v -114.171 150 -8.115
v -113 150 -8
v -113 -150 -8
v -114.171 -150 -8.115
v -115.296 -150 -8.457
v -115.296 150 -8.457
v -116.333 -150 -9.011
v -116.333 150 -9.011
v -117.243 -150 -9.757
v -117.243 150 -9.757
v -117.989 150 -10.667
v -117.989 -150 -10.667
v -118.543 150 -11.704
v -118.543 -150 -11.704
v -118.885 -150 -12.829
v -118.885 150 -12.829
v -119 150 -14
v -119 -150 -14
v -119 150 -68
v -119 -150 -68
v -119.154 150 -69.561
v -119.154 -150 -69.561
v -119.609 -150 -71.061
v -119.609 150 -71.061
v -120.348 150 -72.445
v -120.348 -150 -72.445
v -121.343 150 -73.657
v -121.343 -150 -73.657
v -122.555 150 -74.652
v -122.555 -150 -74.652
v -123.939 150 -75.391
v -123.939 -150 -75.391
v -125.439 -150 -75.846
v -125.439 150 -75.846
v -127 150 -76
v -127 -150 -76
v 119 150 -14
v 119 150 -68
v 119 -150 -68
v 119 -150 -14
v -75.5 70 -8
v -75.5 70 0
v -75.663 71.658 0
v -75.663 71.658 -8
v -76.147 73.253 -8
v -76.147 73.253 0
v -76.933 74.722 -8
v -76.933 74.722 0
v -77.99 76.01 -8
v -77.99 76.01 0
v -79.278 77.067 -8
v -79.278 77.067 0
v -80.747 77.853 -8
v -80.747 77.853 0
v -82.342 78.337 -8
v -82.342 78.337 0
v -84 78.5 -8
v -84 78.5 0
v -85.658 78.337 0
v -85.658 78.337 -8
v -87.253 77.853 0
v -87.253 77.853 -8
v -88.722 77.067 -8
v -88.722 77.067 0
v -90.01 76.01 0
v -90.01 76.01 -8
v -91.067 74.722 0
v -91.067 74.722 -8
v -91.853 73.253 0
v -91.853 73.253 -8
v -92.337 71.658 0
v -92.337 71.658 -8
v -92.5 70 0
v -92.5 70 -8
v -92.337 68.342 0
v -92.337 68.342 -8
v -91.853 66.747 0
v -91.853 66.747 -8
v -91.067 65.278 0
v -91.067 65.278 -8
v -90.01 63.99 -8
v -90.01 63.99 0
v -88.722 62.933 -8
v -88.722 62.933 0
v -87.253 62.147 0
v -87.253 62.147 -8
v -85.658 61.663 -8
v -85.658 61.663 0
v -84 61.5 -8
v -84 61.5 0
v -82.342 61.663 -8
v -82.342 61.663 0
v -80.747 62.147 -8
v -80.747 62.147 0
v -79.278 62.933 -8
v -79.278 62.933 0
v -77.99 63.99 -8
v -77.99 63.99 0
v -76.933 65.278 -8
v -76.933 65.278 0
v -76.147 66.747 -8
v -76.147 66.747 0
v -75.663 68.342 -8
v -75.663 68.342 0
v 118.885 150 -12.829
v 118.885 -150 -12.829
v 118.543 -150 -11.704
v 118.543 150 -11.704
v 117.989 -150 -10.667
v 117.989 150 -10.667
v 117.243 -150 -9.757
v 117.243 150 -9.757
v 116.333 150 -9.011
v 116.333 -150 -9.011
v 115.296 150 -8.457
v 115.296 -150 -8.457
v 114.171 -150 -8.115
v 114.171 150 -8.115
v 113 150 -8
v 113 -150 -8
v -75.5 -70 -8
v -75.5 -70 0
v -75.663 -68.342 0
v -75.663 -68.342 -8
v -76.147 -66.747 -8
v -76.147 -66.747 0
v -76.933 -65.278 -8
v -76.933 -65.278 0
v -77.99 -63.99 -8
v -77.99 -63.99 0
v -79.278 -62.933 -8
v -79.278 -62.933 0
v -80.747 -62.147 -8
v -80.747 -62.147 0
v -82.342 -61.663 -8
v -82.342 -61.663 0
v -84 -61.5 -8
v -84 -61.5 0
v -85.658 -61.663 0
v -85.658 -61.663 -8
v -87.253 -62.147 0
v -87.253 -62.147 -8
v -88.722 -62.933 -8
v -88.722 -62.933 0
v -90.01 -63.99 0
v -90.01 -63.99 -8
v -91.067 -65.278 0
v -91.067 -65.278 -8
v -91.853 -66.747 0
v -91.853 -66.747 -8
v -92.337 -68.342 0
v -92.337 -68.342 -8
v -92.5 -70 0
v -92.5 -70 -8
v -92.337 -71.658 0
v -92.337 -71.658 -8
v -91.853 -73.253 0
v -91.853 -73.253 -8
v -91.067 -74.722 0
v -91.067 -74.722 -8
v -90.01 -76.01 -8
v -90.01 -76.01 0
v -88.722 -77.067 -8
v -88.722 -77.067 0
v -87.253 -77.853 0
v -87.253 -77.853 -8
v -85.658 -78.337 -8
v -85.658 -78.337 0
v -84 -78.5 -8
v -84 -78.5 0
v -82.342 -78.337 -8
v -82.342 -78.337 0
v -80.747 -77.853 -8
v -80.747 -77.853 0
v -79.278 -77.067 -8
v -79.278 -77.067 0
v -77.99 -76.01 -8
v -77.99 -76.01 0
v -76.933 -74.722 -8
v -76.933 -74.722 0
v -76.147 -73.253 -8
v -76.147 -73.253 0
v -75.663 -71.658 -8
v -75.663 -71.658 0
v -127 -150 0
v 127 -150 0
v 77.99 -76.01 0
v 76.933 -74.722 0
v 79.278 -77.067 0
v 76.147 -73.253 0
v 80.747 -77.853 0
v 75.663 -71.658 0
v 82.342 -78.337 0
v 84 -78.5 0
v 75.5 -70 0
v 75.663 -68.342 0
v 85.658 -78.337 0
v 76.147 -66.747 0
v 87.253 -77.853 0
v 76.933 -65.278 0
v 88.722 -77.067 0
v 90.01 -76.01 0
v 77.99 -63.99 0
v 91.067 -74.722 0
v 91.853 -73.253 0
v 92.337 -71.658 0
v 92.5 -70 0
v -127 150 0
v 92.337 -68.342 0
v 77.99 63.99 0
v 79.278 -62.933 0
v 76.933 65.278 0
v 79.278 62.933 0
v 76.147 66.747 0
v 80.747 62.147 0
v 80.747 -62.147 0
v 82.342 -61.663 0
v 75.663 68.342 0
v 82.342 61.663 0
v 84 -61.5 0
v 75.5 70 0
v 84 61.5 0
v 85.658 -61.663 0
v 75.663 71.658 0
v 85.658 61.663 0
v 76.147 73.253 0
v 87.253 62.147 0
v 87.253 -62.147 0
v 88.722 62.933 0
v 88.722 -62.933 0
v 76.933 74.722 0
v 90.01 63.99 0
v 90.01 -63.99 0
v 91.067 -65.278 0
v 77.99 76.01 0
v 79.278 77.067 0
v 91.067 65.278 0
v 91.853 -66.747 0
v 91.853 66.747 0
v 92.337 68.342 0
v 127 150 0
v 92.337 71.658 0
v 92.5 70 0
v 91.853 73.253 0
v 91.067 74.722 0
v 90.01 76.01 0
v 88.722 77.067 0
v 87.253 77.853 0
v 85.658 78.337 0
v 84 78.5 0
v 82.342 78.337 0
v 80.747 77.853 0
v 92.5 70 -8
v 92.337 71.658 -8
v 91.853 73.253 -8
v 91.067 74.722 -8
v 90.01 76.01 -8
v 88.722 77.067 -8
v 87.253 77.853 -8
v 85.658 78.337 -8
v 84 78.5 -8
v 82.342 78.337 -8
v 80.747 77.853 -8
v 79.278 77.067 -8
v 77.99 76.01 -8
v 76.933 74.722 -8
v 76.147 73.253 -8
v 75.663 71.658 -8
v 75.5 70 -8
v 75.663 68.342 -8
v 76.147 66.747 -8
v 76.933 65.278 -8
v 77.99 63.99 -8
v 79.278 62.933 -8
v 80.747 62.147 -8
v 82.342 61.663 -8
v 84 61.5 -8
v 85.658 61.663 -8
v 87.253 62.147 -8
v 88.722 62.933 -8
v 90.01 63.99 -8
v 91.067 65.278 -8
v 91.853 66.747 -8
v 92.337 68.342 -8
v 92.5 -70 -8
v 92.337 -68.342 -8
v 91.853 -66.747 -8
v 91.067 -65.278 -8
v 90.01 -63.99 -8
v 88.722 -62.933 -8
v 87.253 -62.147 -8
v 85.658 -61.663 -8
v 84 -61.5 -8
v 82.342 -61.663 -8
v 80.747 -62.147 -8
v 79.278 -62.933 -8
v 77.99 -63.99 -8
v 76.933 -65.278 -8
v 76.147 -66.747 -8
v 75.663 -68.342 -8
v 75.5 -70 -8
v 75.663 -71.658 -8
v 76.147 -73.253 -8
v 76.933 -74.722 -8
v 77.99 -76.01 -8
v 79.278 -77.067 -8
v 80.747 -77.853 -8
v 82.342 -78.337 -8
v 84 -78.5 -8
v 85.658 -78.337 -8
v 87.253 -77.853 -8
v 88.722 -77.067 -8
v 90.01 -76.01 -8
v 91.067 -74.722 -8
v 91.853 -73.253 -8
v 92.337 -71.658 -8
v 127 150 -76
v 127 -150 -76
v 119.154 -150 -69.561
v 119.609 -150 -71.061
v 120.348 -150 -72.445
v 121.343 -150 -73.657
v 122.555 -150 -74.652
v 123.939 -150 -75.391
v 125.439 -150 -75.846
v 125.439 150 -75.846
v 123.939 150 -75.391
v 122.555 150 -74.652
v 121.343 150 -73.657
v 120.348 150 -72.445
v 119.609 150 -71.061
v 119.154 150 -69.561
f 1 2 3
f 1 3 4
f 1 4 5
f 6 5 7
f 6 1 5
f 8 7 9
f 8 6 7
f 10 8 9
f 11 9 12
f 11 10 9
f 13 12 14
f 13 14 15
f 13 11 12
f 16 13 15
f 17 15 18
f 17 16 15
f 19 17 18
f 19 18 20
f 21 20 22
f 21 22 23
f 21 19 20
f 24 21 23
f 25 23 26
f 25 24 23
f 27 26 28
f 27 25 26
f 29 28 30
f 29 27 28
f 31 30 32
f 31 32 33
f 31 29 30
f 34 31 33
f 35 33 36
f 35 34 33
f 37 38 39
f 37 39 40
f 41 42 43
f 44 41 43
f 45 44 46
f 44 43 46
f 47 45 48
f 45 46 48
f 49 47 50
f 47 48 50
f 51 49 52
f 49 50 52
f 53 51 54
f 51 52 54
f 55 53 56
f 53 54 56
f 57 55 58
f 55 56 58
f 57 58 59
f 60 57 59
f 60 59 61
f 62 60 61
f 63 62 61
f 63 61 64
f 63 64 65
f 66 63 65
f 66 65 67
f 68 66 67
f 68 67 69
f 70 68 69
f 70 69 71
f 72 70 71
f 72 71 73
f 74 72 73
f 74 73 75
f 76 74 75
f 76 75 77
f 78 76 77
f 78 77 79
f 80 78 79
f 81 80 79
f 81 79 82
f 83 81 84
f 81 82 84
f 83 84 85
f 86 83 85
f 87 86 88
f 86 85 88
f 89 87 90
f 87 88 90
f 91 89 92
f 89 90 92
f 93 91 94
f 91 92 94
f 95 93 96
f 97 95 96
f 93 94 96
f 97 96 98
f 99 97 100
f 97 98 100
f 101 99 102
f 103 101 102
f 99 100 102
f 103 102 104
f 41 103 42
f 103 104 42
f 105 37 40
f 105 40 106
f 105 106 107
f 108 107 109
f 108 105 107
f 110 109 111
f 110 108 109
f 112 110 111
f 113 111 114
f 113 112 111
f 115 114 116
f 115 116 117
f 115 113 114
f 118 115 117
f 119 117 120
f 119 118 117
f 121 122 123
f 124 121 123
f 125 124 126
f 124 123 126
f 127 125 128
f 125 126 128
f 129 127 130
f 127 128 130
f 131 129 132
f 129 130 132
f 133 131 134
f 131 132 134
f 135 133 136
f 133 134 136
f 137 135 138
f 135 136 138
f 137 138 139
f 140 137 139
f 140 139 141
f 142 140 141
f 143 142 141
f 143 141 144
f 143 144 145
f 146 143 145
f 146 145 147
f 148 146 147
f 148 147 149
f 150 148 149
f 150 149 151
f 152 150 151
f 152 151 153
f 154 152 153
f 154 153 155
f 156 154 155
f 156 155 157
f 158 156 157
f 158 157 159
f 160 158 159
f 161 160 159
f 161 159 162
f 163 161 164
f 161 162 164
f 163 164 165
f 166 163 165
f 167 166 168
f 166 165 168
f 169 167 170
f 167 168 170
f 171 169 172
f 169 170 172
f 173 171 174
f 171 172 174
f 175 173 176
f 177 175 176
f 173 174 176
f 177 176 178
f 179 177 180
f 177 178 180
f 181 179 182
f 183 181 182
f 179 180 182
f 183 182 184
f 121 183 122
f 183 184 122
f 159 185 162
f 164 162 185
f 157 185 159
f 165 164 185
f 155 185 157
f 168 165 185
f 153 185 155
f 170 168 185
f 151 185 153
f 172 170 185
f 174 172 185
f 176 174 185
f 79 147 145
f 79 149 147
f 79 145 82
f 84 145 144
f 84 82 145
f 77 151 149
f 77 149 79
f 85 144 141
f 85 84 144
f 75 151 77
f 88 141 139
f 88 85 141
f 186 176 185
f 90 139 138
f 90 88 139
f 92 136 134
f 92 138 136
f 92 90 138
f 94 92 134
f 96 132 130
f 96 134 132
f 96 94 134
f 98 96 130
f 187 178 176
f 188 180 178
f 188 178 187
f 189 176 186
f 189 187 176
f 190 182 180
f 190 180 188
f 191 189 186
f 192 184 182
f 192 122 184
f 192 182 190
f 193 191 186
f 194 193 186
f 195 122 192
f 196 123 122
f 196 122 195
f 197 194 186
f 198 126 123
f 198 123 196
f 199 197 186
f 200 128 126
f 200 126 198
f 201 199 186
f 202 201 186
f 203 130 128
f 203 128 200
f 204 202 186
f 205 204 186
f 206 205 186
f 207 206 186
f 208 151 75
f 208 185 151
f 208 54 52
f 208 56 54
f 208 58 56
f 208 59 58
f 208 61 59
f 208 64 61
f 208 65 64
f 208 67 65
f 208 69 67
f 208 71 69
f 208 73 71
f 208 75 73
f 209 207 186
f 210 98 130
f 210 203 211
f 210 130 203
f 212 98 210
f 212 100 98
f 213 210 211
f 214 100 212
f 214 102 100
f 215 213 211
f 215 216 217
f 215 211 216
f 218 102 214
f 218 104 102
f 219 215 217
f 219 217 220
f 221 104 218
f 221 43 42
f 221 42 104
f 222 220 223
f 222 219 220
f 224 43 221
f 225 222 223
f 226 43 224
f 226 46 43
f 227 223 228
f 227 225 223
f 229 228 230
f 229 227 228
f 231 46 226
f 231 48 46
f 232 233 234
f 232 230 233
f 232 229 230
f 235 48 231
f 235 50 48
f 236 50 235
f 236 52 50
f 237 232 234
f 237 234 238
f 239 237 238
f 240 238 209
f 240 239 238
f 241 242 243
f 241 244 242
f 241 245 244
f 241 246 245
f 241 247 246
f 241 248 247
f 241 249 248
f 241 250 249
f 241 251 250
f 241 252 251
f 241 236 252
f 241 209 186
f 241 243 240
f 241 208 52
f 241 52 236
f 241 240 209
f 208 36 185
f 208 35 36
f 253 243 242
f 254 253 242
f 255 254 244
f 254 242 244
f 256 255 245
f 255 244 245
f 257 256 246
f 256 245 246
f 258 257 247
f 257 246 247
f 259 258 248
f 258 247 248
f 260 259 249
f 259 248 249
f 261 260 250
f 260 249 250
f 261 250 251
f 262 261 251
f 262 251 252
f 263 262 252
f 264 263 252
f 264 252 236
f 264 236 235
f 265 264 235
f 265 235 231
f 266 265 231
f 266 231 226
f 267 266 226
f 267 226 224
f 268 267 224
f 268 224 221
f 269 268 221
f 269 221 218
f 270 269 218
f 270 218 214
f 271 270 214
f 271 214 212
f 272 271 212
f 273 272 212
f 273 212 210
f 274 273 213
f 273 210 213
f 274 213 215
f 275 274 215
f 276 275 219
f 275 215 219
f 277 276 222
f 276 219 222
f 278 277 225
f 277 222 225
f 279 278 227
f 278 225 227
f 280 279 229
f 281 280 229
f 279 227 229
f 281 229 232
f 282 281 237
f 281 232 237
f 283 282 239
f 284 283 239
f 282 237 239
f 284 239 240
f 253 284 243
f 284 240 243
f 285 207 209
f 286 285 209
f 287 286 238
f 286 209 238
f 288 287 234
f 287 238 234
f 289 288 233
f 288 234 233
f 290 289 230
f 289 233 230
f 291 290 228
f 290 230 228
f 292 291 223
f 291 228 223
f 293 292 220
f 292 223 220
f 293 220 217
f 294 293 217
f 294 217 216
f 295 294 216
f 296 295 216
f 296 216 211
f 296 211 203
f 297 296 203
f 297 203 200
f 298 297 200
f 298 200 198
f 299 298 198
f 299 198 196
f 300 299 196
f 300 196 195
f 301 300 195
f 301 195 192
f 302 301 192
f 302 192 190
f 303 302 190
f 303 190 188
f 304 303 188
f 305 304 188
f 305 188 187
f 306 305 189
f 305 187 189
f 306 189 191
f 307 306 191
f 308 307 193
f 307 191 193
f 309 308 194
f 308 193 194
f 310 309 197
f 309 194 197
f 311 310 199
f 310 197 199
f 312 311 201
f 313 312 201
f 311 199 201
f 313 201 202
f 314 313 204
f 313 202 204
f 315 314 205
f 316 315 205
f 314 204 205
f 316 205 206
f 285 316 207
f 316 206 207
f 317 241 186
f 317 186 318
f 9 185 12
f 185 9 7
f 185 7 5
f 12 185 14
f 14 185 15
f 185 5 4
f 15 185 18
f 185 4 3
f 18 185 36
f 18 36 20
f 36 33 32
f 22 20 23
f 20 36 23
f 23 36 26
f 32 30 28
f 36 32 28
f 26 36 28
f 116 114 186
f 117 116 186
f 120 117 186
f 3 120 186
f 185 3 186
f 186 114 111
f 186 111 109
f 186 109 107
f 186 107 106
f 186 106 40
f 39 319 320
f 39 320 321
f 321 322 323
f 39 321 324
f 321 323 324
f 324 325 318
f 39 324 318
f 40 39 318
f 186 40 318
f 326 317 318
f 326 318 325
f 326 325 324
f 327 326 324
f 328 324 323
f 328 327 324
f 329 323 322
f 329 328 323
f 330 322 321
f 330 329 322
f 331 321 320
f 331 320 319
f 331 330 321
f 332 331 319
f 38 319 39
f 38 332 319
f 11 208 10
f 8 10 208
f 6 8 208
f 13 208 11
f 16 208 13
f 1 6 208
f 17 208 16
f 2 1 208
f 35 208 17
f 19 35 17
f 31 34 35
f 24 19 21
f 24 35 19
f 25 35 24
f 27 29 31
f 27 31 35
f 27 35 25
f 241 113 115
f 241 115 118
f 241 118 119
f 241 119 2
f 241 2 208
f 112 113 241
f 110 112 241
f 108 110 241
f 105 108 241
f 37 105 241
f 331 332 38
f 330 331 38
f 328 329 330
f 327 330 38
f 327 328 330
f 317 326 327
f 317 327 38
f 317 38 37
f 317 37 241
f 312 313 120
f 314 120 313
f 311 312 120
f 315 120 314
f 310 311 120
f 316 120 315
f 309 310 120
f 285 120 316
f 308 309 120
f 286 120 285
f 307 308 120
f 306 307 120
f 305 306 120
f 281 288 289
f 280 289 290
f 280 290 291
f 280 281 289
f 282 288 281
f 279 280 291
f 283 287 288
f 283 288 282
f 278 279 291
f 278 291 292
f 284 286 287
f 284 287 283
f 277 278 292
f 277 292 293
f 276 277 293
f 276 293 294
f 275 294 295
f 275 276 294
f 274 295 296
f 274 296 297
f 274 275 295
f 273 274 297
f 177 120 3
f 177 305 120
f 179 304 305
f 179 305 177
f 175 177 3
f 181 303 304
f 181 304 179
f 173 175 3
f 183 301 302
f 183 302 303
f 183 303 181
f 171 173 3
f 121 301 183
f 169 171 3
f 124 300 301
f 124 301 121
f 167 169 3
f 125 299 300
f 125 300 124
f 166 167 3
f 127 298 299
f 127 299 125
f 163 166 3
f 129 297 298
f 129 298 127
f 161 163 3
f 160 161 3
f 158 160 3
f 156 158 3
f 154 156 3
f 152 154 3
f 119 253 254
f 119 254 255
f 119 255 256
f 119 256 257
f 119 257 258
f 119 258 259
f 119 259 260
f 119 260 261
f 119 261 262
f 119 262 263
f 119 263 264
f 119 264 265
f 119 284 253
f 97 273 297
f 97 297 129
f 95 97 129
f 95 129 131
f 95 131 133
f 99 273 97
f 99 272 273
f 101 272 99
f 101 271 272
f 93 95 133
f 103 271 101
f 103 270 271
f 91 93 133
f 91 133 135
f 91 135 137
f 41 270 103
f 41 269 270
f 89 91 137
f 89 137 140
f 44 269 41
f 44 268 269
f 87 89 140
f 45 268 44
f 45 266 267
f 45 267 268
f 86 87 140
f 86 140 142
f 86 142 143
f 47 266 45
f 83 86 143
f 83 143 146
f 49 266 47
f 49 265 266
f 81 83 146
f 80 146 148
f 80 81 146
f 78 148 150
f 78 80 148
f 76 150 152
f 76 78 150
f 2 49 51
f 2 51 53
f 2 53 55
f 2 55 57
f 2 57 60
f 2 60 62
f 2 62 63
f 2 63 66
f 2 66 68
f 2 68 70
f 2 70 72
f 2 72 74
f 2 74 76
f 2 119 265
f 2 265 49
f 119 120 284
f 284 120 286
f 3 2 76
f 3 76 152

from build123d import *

# Parameters (mm, degrees)
EXTRUDE1_DEPTH     = 150
CUT_EXTRUDE1_REACH = 78
SKETCH2_R          = 8.5


with BuildPart() as part:
    # Sketch1 → Extrude1 (new body, symmetric)
    with BuildSketch(Plane(origin=(0, 0, 0), x_dir=(1, 0, 0), z_dir=(0, 1, 0))):
        with BuildLine():
            Line((-127, 0), (127, 0))
            Line((127, 0), (127, 76))
            ThreePointArc((127, 76), (121.343145751, 73.656854249), (119, 68))
            Line((119, 68), (119, 14))
            ThreePointArc((119, 14), (117.242640687, 9.757359313), (113, 8))
            Line((113, 8), (-113, 8))
            ThreePointArc((-113, 8), (-117.242640687, 9.757359313), (-119, 14))
            Line((-119, 14), (-119, 68))
            ThreePointArc((-119, 68), (-121.343145751, 73.656854249), (-127, 76))
            Line((-127, 76), (-127, 0))
        make_face()
    extrude(amount=EXTRUDE1_DEPTH, both=True)

    # Sketch2 → Cut-Extrude1 (cut, up to next)
    with BuildSketch(Plane.XY, mode=Mode.PRIVATE) as cut_extrude1_sk1:
        with Locations((84, 70)):
            Circle(SKETCH2_R)
    cut_extrude1_tool1 = extrude(cut_extrude1_sk1.sketch, amount=-CUT_EXTRUDE1_REACH, mode=Mode.PRIVATE) & part.part
    add(cut_extrude1_tool1.solids().sort_by_distance((84, 70, 0))[0], mode=Mode.SUBTRACT)
    # Sketch2 → Cut-Extrude1 (cut, up to next)
    with BuildSketch(Plane.XY, mode=Mode.PRIVATE) as cut_extrude1_sk2:
        with Locations((-84, 70)):
            Circle(SKETCH2_R)
    cut_extrude1_tool2 = extrude(cut_extrude1_sk2.sketch, amount=-CUT_EXTRUDE1_REACH, mode=Mode.PRIVATE) & part.part
    add(cut_extrude1_tool2.solids().sort_by_distance((-84, 70, 0))[0], mode=Mode.SUBTRACT)
    # Sketch2 → Cut-Extrude1 (cut, up to next)
    with BuildSketch(Plane.XY, mode=Mode.PRIVATE) as cut_extrude1_sk3:
        with Locations((-84, -70)):
            Circle(SKETCH2_R)
    cut_extrude1_tool3 = extrude(cut_extrude1_sk3.sketch, amount=-CUT_EXTRUDE1_REACH, mode=Mode.PRIVATE) & part.part
    add(cut_extrude1_tool3.solids().sort_by_distance((-84, -70, 0))[0], mode=Mode.SUBTRACT)
    # Sketch2 → Cut-Extrude1 (cut, up to next)
    with BuildSketch(Plane.XY, mode=Mode.PRIVATE) as cut_extrude1_sk4:
        with Locations((84, -70)):
            Circle(SKETCH2_R)
    cut_extrude1_tool4 = extrude(cut_extrude1_sk4.sketch, amount=-CUT_EXTRUDE1_REACH, mode=Mode.PRIVATE) & part.part
    add(cut_extrude1_tool4.solids().sort_by_distance((84, -70, 0))[0], mode=Mode.SUBTRACT)


solid = part.part
